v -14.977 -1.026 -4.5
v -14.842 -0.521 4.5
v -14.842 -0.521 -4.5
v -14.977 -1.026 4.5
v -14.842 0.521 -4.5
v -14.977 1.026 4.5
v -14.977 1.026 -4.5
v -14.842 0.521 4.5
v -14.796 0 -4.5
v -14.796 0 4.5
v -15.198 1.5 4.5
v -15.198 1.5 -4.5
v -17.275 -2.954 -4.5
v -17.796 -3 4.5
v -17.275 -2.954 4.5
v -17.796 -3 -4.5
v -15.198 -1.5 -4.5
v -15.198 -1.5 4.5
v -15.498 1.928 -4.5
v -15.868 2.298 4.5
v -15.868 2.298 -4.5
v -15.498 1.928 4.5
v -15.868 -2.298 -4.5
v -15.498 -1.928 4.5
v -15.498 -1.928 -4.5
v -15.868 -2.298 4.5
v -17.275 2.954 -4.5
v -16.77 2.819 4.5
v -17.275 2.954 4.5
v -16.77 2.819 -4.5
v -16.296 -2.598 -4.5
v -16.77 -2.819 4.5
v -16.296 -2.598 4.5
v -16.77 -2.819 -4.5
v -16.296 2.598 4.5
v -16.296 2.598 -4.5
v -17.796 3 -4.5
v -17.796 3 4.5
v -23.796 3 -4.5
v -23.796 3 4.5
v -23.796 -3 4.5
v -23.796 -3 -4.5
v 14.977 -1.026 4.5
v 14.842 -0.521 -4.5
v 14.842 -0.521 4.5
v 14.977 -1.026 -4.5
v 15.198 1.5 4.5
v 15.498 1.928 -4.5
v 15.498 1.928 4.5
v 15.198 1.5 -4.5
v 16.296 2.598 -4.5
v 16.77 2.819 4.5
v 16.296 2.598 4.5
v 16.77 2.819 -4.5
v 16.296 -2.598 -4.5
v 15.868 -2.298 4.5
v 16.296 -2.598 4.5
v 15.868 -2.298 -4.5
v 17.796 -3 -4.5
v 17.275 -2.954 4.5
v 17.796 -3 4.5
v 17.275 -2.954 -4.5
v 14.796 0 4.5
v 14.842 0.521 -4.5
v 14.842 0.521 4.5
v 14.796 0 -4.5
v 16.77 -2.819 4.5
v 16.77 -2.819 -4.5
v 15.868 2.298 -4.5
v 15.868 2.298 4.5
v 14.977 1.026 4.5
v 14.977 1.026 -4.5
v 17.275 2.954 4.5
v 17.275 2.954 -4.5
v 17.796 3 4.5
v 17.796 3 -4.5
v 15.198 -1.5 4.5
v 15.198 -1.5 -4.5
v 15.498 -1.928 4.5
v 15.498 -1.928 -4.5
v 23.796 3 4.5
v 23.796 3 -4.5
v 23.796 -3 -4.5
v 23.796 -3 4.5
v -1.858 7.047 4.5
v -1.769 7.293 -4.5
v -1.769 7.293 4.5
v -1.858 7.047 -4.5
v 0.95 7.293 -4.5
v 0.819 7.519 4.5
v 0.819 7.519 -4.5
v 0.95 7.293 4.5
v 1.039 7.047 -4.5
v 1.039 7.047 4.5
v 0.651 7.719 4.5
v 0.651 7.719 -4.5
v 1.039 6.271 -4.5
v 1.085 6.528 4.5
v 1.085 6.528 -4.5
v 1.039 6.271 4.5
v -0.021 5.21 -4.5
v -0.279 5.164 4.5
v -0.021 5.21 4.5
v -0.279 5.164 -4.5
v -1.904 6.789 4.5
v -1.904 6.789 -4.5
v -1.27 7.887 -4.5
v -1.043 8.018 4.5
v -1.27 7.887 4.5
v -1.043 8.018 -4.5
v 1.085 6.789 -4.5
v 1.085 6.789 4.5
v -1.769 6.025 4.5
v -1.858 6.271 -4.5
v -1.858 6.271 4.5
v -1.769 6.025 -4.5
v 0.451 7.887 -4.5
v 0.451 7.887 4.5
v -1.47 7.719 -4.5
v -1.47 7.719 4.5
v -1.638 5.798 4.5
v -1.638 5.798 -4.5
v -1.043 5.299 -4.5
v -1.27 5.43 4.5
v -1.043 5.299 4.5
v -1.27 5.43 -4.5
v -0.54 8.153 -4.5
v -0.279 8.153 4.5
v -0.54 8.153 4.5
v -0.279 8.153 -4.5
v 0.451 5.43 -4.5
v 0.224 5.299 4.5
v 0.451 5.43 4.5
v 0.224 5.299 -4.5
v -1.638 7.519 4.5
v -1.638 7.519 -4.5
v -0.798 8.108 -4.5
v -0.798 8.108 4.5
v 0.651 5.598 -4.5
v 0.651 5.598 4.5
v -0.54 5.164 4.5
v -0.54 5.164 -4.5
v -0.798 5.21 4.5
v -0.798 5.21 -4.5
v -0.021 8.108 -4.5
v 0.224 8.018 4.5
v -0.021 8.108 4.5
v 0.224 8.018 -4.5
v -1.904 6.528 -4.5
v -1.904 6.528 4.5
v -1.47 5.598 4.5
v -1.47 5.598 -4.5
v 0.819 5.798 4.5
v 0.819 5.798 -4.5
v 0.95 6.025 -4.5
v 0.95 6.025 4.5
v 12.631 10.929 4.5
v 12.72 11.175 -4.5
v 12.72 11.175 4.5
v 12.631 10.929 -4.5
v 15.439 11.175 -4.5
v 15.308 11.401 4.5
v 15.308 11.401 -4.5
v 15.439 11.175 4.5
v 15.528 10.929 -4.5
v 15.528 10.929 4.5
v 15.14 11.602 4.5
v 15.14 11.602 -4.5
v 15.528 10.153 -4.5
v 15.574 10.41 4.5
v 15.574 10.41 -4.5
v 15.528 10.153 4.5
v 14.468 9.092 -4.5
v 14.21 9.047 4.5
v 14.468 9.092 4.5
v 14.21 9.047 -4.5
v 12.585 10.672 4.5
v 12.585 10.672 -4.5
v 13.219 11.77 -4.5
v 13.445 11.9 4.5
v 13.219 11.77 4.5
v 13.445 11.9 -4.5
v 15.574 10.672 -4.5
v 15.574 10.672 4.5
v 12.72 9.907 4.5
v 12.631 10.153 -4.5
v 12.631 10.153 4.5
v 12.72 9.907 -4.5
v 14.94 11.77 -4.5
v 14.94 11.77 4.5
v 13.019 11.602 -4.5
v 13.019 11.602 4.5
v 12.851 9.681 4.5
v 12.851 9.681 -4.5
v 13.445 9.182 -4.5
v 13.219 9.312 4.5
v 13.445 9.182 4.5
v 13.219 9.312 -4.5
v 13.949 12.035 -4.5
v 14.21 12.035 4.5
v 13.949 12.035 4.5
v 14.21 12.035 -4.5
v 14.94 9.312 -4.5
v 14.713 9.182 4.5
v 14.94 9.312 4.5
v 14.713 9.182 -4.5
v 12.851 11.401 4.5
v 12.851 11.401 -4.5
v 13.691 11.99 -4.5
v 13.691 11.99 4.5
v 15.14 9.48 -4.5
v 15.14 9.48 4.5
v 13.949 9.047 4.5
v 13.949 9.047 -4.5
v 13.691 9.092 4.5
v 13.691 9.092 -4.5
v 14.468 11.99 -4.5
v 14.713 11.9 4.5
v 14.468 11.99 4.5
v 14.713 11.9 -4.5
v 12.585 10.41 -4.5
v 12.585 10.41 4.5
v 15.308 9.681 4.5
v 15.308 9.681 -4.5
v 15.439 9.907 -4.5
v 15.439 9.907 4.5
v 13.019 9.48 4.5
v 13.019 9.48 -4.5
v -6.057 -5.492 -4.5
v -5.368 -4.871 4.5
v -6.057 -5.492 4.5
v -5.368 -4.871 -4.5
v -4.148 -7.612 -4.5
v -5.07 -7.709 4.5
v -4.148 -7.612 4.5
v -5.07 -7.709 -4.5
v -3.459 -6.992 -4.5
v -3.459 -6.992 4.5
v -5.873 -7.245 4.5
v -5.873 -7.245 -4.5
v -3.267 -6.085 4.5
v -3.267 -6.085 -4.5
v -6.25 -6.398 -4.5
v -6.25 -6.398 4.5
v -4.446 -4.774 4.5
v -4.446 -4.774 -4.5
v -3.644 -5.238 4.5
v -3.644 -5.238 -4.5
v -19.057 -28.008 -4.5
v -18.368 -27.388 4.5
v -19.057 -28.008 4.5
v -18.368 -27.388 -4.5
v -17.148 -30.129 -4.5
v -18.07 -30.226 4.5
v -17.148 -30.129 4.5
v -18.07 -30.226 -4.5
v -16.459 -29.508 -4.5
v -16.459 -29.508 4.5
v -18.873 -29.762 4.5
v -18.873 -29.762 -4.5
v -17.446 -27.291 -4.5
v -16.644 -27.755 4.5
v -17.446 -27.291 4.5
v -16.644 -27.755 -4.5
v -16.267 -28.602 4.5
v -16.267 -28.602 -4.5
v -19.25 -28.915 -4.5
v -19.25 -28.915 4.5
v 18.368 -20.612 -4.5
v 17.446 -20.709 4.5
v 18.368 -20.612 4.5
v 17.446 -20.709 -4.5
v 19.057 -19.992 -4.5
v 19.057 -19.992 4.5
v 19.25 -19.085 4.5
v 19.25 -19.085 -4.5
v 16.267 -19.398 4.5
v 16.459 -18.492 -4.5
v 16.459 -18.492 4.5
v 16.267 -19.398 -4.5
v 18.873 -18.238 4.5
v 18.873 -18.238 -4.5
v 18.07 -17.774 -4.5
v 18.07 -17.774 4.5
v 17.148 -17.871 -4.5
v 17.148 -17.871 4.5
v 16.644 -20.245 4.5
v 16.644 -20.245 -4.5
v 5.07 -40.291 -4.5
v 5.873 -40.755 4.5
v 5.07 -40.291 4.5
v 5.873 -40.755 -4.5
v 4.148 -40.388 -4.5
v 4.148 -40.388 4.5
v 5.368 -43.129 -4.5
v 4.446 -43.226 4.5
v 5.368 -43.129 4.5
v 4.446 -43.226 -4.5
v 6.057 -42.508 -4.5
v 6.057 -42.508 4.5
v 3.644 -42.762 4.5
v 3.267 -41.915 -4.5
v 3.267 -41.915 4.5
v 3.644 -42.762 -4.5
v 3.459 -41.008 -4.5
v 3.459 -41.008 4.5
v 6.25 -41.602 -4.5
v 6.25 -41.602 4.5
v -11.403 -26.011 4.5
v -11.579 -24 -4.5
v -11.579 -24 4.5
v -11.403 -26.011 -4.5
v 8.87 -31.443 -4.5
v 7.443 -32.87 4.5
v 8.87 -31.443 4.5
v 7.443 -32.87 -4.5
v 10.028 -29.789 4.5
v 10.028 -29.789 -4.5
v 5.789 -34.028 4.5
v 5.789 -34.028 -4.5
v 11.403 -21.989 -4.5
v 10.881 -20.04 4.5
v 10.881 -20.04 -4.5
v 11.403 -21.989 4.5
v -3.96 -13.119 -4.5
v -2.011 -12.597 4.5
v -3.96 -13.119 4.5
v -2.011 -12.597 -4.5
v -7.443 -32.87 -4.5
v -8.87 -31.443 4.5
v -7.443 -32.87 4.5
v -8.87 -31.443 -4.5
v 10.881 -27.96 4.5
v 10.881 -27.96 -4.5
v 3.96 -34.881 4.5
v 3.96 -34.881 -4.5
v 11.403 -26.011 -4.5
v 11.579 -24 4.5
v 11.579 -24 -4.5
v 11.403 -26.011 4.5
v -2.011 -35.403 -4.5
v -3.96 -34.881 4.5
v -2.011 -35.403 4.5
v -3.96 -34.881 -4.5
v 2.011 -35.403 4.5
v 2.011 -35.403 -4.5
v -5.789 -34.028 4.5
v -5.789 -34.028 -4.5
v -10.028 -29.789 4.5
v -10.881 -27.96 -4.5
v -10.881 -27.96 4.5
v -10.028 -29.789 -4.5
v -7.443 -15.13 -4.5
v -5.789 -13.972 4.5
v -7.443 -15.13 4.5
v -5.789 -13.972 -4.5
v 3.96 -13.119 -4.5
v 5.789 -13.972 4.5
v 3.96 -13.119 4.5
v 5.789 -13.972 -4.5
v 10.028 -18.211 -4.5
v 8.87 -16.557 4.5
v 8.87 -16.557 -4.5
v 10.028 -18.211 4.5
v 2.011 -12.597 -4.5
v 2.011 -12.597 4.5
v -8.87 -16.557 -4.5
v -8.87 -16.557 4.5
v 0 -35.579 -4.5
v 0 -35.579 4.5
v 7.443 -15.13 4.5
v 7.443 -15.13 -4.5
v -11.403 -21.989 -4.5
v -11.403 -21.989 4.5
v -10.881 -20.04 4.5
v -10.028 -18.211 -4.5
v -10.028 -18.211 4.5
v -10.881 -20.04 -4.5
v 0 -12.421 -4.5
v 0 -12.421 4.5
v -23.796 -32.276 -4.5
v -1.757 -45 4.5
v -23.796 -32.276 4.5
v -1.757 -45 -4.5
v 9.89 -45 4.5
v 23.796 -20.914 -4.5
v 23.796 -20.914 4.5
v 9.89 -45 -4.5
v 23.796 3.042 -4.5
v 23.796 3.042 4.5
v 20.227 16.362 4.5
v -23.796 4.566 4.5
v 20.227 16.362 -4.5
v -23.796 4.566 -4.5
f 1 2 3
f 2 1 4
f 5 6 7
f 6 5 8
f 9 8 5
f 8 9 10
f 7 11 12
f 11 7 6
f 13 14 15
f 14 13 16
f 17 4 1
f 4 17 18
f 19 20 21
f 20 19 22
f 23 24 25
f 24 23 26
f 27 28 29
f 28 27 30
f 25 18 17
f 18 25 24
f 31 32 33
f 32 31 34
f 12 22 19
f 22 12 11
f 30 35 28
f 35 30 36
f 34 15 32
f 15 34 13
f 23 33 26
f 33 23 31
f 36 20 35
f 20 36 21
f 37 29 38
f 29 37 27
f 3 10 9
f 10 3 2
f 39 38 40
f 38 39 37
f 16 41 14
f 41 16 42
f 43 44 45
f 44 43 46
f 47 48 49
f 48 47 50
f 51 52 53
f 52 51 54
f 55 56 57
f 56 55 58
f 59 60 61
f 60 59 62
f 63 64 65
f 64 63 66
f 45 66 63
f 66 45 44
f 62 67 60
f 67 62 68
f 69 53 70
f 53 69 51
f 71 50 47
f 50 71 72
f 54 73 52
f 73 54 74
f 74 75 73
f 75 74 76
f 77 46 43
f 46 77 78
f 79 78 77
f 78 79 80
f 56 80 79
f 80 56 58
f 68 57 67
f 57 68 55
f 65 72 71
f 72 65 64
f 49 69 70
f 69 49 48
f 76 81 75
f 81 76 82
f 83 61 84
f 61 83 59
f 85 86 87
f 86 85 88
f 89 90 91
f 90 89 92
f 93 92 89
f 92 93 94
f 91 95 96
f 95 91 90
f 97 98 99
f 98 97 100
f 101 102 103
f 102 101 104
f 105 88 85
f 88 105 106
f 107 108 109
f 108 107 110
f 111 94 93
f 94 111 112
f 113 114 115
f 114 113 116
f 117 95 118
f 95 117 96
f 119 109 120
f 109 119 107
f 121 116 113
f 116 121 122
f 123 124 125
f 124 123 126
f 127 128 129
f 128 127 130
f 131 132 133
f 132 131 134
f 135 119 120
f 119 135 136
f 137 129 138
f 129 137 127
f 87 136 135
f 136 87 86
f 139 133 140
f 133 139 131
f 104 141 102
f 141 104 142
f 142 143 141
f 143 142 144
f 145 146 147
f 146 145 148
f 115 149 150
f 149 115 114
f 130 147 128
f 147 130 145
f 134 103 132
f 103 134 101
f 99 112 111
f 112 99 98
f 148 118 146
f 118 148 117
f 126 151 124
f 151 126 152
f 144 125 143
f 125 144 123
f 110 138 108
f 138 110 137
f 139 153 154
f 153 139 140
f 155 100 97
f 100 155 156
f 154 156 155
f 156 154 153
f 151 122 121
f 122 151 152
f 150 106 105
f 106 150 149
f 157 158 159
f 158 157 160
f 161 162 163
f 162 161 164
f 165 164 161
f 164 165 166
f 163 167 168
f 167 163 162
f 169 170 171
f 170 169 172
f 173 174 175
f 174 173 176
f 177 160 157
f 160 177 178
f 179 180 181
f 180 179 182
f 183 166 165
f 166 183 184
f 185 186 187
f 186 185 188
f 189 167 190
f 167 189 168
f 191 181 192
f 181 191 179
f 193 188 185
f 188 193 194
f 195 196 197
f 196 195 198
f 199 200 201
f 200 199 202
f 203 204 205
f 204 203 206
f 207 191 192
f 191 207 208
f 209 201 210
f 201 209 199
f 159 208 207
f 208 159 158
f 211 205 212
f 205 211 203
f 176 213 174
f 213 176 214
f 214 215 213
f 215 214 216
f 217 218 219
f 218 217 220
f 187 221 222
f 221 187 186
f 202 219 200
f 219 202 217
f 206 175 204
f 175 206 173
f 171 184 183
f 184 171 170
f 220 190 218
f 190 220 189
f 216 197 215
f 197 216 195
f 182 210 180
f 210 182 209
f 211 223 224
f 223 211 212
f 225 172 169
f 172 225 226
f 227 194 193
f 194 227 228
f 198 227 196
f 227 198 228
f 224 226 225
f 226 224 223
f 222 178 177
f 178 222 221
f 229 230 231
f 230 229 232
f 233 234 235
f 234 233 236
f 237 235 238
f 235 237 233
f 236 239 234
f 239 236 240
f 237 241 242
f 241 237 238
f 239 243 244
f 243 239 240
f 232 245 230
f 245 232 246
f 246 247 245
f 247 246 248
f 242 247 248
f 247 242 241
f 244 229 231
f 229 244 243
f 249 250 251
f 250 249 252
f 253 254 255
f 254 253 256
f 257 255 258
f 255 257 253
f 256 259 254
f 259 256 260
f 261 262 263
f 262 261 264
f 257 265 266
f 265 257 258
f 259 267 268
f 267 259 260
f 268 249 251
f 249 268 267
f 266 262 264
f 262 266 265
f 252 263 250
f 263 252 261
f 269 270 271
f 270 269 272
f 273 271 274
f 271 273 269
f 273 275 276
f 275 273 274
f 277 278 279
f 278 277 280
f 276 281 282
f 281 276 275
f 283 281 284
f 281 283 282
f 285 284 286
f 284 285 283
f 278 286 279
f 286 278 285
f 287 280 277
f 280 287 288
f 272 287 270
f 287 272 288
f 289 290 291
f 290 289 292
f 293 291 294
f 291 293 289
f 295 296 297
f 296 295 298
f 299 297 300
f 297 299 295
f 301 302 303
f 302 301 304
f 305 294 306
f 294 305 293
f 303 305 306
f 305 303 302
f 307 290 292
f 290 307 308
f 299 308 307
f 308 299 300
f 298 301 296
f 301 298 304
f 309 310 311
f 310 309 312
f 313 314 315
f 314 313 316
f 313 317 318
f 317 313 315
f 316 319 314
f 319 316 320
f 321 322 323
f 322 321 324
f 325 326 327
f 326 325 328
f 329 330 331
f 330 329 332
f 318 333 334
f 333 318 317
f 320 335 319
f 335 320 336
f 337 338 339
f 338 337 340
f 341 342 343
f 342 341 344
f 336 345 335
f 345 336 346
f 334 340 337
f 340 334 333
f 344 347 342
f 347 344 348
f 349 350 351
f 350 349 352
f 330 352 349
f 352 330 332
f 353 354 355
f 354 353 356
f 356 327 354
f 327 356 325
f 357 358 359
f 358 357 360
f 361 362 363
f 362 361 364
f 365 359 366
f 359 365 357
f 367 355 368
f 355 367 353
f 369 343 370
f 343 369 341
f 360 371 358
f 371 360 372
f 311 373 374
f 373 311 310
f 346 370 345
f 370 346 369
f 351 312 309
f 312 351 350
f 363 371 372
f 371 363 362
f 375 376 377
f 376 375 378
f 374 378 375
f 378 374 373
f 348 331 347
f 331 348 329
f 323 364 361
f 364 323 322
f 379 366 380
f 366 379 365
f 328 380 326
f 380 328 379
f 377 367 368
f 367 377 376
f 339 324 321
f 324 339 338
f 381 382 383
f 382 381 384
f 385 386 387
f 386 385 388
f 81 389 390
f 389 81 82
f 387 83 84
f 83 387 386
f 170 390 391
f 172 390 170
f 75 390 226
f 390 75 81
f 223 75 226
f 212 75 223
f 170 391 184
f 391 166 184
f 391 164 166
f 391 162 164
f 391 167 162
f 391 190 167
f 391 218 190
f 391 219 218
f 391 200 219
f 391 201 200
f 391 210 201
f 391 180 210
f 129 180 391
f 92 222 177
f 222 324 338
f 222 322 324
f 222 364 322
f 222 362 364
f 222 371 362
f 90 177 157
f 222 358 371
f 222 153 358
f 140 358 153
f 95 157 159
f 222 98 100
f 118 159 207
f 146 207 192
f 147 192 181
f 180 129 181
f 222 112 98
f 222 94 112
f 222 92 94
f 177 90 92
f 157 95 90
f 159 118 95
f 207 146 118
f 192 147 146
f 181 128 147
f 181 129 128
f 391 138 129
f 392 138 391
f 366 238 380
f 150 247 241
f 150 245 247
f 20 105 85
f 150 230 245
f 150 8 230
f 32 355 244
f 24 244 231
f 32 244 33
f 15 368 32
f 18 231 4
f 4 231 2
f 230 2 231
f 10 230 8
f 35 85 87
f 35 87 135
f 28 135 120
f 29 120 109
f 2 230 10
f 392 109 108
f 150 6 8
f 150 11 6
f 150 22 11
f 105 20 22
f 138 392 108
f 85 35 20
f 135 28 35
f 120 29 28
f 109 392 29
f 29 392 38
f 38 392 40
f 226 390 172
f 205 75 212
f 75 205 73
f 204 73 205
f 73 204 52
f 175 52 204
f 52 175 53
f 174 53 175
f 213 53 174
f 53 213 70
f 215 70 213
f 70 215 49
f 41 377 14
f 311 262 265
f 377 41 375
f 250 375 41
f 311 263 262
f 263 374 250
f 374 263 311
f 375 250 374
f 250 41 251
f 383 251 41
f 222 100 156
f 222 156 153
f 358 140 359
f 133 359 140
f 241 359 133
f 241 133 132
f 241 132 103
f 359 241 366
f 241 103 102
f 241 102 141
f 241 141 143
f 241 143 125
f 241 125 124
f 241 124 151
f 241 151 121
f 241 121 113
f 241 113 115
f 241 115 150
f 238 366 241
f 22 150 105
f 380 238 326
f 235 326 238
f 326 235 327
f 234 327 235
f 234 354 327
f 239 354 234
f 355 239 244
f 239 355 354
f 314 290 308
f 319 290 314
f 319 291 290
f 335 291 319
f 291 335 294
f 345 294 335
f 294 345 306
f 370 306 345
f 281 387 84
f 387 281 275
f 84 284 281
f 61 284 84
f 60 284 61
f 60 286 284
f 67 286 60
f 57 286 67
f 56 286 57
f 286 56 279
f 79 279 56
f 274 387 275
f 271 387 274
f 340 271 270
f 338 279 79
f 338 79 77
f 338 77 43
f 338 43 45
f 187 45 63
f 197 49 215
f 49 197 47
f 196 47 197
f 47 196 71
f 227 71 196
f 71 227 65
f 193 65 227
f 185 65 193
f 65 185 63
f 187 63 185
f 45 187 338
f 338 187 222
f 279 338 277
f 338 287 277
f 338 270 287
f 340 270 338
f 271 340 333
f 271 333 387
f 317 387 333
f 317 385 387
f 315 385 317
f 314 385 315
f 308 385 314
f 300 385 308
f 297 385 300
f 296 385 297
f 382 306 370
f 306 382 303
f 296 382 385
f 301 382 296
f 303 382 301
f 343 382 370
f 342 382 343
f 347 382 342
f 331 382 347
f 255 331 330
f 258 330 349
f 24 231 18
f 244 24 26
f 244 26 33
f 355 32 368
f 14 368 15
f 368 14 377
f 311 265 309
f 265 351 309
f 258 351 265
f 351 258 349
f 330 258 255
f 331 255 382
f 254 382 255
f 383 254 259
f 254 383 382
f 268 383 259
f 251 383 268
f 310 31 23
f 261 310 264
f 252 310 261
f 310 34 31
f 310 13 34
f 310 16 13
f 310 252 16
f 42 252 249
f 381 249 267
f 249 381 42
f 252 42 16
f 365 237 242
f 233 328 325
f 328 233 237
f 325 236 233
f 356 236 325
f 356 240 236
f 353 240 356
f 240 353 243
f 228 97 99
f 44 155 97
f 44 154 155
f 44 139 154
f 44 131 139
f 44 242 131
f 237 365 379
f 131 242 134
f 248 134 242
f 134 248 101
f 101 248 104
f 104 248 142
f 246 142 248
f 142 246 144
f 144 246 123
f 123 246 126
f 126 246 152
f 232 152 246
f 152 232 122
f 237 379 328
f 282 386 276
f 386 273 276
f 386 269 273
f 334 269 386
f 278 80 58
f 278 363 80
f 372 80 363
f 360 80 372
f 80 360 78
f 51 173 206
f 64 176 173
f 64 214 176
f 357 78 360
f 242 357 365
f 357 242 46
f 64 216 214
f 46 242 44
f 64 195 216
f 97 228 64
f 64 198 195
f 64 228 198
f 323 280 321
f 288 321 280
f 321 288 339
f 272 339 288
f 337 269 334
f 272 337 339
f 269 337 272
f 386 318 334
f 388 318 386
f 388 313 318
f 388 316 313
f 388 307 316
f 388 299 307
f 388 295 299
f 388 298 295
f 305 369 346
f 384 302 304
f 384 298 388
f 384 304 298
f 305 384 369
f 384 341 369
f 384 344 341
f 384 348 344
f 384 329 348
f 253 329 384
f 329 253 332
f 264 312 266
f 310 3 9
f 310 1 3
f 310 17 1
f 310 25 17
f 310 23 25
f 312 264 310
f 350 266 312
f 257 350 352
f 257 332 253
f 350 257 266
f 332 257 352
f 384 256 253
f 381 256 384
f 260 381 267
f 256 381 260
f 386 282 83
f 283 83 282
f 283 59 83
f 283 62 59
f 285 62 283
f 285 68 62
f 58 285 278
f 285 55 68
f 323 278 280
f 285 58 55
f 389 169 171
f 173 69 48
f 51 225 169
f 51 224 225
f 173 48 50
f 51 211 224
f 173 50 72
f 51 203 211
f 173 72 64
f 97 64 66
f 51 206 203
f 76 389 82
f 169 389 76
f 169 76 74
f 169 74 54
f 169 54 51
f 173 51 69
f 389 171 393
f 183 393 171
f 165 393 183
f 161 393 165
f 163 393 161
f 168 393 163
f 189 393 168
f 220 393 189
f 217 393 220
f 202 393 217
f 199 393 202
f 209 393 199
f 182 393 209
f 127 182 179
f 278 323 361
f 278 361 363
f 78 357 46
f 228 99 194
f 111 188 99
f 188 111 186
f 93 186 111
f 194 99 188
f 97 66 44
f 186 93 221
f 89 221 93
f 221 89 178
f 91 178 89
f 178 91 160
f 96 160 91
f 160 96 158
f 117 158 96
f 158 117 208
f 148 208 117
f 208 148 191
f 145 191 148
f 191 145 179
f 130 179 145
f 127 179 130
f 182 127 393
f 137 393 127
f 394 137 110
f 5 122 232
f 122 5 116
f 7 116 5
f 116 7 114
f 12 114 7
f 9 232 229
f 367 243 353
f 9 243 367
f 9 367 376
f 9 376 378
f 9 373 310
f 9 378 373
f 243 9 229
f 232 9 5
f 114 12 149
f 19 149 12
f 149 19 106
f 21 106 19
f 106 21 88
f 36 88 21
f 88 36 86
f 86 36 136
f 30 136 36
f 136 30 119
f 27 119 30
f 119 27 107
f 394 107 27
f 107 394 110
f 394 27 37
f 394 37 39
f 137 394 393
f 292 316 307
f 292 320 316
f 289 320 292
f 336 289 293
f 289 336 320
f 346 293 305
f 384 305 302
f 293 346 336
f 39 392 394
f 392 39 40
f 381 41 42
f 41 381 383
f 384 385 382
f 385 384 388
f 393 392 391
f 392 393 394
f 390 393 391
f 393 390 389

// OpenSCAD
// file: nema14_motor.scad
include <parameters.scad>;
use <library.scad>

module nema14()
{
	color([1,0.4,0.4,1])
	union()
	{
		translate([0, 0, nema14_shaft_length/2 - nema14_shaft_projection - nema14_hub_depth])
			cylinder(r = nema14_shaft/2, h = nema14_shaft_length, center = true, $fn=20);
		translate([0, 0, -nema14_hub_depth])
			cylinder(r = nema14_hub/2, h = nema14_hub_depth*2, center = true, $fn=20);
		translate([0, 0, nema14_length/2])
			cube([nema14_square,nema14_square,nema14_length], center = true);
		union()
		{
			for ( x = [0:1] ) 
			for ( y = [0:1] )
			{
				translate([(x-0.5)*nema14_screws, (y-0.5)*nema14_screws, 0])
					cylinder(r = screwsize/2, h = 30, center = true, $fn=10);
			}
		}
	}


}

//nema14();
// file: library.scad
include <parameters.scad>;


// inner and outer product.  Why aren't these standard?!!!?

function ip(v1 = [0,0,0], v2 = [0,0,0]) = v1.x*v2.x + v1.y*v2.y + v1.z*v2.z;

function op(v1 = [0,0,0], v2 = [0,0,0]) = [v1.y*v2.z - v1.z*v2.y, v1.z*v2.x - v1.x*v2.z, v1.x*v2.y - v1.y*v2.x];

module nema14()
{
	color([1,0.4,0.4,1])
	union()
	{
		translate([0, 0, nema14_shaft_length/2 - nema14_shaft_projection - nema14_hub_depth])
			cylinder(r = nema14_shaft/2, h = nema14_shaft_length, center = true, $fn=20);
		translate([0, 0, -nema14_hub_depth])
			cylinder(r = nema14_hub/2, h = nema14_hub_depth*2, center = true, $fn=20);
		translate([0, 0, nema14_length/2])
			cube([nema14_square,nema14_square,nema14_length], center = true);
		union()
		{
			for ( x = [0:1] ) 
			for ( y = [0:1] )
			{
				translate([(x-0.5)*nema14_screws, (y-0.5)*nema14_screws, 0])
					cylinder(r = screwsize/2, h = 30, center = true, $fn=10);
			}
		}
	}


}

// Pentagon nut that matches a hexagon...

module pentanut(height=40)
{
	rotate([0,0,60])
	intersection()
	{
		translate([-nutsize,-nutsize*5,-20])
			cube([nutsize*10, nutsize*10,height]);
		rotate([0,0,60])
			translate([-nutsize,-nutsize*5,-20])
				cube([nutsize*10, nutsize*10,height]);
		rotate([0,0,120])
			translate([-nutsize,-nutsize*5,-20])
				cube([nutsize*10, nutsize*10,height]);
		rotate([0,0,180])
			translate([-nutsize,-nutsize*5,-20])
				cube([nutsize*10, nutsize*10,height]);
		rotate([0,0,240])
			translate([-nutsize,-nutsize*5,-20])
				cube([nutsize*10, nutsize*10,height]);
	}
}


// Make a RepRap teardrop with its axis along Z
// If truncated is true, chop the apex; if not, come to a point

// I stole this function from Erik...


module teardrop(radius, height, truncateMM)
{
	union()
	{
		if(truncateMM > 0)
		{
			intersection()
			{
				translate([truncateMM,0,height/2]) 
					scale([1,1,height])
						cube([radius*2.8275,radius*2,1],center=true);
				scale([1,1,height]) 
						rotate([0,0,3*45])
							cube([radius,radius,1]);
			}
		} else
		{
			scale([1,1,height])
				rotate([0,0,3*45])
					cube([radius,radius,1]);
		}
		cylinder(r=radius, h = height, $fn=20);
	}
}


// Make a ball-bearing holder cutout

module bearing_holder(radius = 6.5)
{
	union()
	{
		cylinder (h = radius*5, r = radius, center = true, $fn = 20);
		for(i=[0:2])
		{
			rotate([0,0,120*i])
				translate([radius+screwsize/2, 0, 0])
					union()
					{
						cylinder (h = radius*5, r = screwsize/2, center = true, $fn = 20);
						translate([-screwsize, 0, 0])
							cube([2*screwsize, screwsize, radius*5], center = true);
					}
		}
	}
}

// Make a cuboid with a 45 degree top for vertical slots etc

module cen_hat(size)
{
	translate([0, 0, size.x/sqrt(2)])
		union()
		{
			rotate([0, 45, 0])
				cube([size.x, size.y, 5*max(size.x, max(size.y, size.z))], center=true);
			rotate([0, -45, 0])
				cube([size.x, size.y, 5*max(size.x, max(size.y, size.z))], center=true);
		}
}

module hat_cube(size = [1,1,1], center = false)
{
	difference()
	{
		cube(size, center);
		if(center)
			translate([0, 0, size.z/2])
				cen_hat(size);
		else
			translate([size.x/2, size.y/2, size.z])
				cen_hat(size);
	}
}



module rod(length, threaded) if (threaded && renderrodthreads) {
	linear_extrude(height = length, center = true, convexity = 10, twist = -360 * length / rodpitch, $fn = fn)
		translate([rodsize * 0.1 / 2, 0, 0])
			circle(r = rodsize * 0.9 / 2, $fn = fn);
} else cylinder(h = length, r = rodsize / 2, center = true, $fn = fn);


module rodnut(position, washer) render() translate([0, 0, position]) {
	intersection() {
		scale([1, 1, 0.5]) sphere(r = 1.05 * rodsize, center = true);
		difference() {
			cylinder (h = rodnutsize, r = rodnutdiameter / 2, center = true, $fn = 6);
			rod(rodnutsize + 0.1);
		}
	}
	if (washer == 1 || washer == 4) rodwasher(((position > 0) ? -1 : 1) * (rodnutsize + rodwashersize) / 2);
	if (washer == 2 || washer == 4) rodwasher(((position > 0) ? 1 : -1) * (rodnutsize + rodwashersize) / 2);
}


module rodwasher(position) render() translate ([0, 0, position]) difference() {
	cylinder(r = rodwasherdiameter / 2, h = rodwashersize, center = true, $fn = fn);
	rod(rodwashersize + 0.1);
}


module screw(length, nutpos, washer, bearingpos = -1) union(){
	translate([0, 0, -length / 2]) if (renderscrewthreads) {
		linear_extrude(height = length, center = true, convexity = 10, twist = -360 * length / screwpitch, $fn = fn)
			translate([screwsize * 0.1 / 2, 0, 0])
				circle(r = screwsize * 0.9 / 2, $fn = fn);
	} else cylinder(h = length, r = screwsize / 2, center = true, $fn = fn);
	render() difference() {
		translate([0, 0, screwsize / 2]) cylinder(h = screwsize, r = screwsize, center = true, $fn = fn);
		translate([0, 0, screwsize]) cylinder(h = screwsize, r = screwsize / 2, center = true, $fn = 6);
	}
	if (washer > 0 && nutpos > 0) {
		washer(nutpos);
		nut(nutpos + washersize);
	} else if (nutpos > 0) nut(nutpos);
	if (bearingpos >= 0) bearing(bearingpos);
}


module bearing(position) render() translate([0, 0, -position - bearingwidth / 2]) union() {
	difference() {
		cylinder(h = bearingwidth, r = bearingsize / 2, center = true, $fn = fn);
		cylinder(h = bearingwidth * 2, r = bearingsize / 2 - 1, center = true, $fn = fn);
	}
	difference() {
		cylinder(h = bearingwidth - 0.5, r = bearingsize / 2 - 0.5, center = true, $fn = fn);
		cylinder(h = bearingwidth * 2, r = screwsize / 2 + 0.5, center = true, $fn = fn);
	}
	difference() {
		cylinder(h = bearingwidth, r = screwsize / 2 + 1, center = true, $fn = fn);
		cylinder(h = bearingwidth + 0.1, r = screwsize / 2, center = true, $fn = fn);
	}
}


module nut(position, washer) render() translate([0, 0, -position - nutsize / 2]) {
	intersection() {
		scale([1, 1, 0.5]) sphere(r = 1.05 * screwsize, center = true);
		difference() {
			cylinder (h = nutsize, r = nutdiameter / 2, center = true, $fn = 6);
			cylinder(r = screwsize / 2, h = nutsize + 0.1, center = true, $fn = fn);
		}
	}
	if (washer > 0) washer(0);
}


module washer(position) render() translate ([0, 0, -position - washersize / 2]) difference() {
	cylinder(r = washerdiameter / 2, h = washersize, center = true, $fn = fn);
	cylinder(r = screwsize / 2, h = washersize + 0.1, center = true, $fn = fn);
}


//rod(20);
//translate([rodsize * 2.5, 0, 0]) rod(20, true);
//translate([rodsize * 5, 0, 0]) screw(10, true);
//translate([rodsize * 7.5, 0, 0]) bearing();
//translate([rodsize * 10, 0, 0]) rodnut();
//translate([rodsize * 12.5, 0, 0]) rodwasher();
//translate([rodsize * 15, 0, 0]) nut();
//translate([rodsize * 17.5, 0, 0]) washer();

//hat_cube(size=[2,40,2], center=false);

//bearing_holder();

pentanut();
// file: parameters.scad
// Parameters file for RepRap Huxley

pi=3.14159265;

// The relative location in your file system where the .dxf files are
// DXFs are for quick development.  They should be replaced by parameterised CSG in dure course.

fileroot="DXF-files/";

rodsize = 6;	//threaded/smooth rod diameter in mm
xaxis = 182.5;	//width of base in mm
yaxis = 266.5;	//length of base in mm


screwsize = 3;	//bearing bore/screw diameter in mm
bearingsize = 10;	//outer diameter of bearings in mm
bearingwidth = 4;	//width of bearings in mm


rodpitch = rodsize / 6;
rodnutsize = 0.8 * rodsize;
rodnutdiameter = 1.9 * rodsize;
rodwashersize = 0.2 * rodsize;
rodwasherdiameter = 2 * rodsize;
screwpitch = screwsize / 6;
nutsize = 0.8 * screwsize;
nutdiameter = 1.9 * screwsize;
washersize = 0.2 * screwsize;
washerdiameter = 2 * screwsize;
partthick = 2 * rodsize;
vertexrodspace = 2 * rodsize;


c = [0.3, 0.3, 0.3];
rodendoffset = rodnutsize + rodwashersize * 2 + partthick / 2;
vertexoffset = vertexrodspace + rodendoffset;


renderrodthreads = false;
renderscrewthreads = false;
fn = 36;

// The gap between the joining rods at a vertex

vertex_radius=sqrt(rodsize*rodsize + vertexoffset*vertexoffset);
vertex_ang = atan(vertexoffset/rodsize)-30;
vertex_gap = 2*vertex_radius*cos(vertex_ang);

// Nema 14 dimensions - these are absolute

nema14_square=35.3;
nema14_screws=26;
nema14_hub=22;
nema14_hub_depth=2;
nema14_length=36;
nema14_shaft=5;
nema14_shaft_length=66;
nema14_shaft_projection=19;

// The RepRap slide bearings

bearing_mount_centres=18;
bearing_width=7;

// X axis parameters - many should be relative

motor_center_y = 26;
bar_clamp_x=5;
bar_clamp_y=8;
bar_clamp_x_gap=23;
bearing_y=50;
bearing_x=bar_clamp_x_gap + 10;
hole_land=4;
thickness=5;
bearing_low_z = 8;
bearing_z_gap = 25;
bearing_plate_width = bearing_mount_centres+2*hole_land + 10;
bearing_plate_overlap=0.5;
bearing_plate_support=10;
// main file
include <parameters.scad>;
use <library.scad>;
include<nema14_motor.scad>

module y_axis_motor_mount()
{


	difference()
	{
		translate([0, rodsize, 0])
			cube([vertex_gap+2*rodsize, 17*rodsize, 1.5*rodsize], center = true);
		translate([-vertex_gap/2, 0, 0]) 
			union()
			{
				cylinder(h = 3*rodsize, r = rodsize / 2, center = true, $fn = fn);
				translate([-rodsize, 0, 0]) 
					cube([2*rodsize, rodsize, 3*rodsize], center=true);
			}
		translate([vertex_gap/2, 0, 0]) 
			union()
			{
				cylinder(h = 3*rodsize, r = rodsize / 2, center = true, $fn = fn);
				translate([rodsize, 0, 0]) 
					cube([2*rodsize, rodsize, 3*rodsize], center=true);
			}
			

		translate([0, 7*rodsize, 0])
			rotate([0,0,15])
				cube([2*(vertex_gap+rodsize), 10*rodsize, 3*rodsize], center = true);	
		translate([5.6*rodsize, 6*rodsize, 0])
			rotate([0,0,105])
				cube([2*(vertex_gap+rodsize), 6*rodsize, 3*rodsize], center = true);

		translate([-vertex_gap/2, rodsize/3, 0])
			rotate([0,0,15])
			{
				translate([3*rodsize, 0, 0])
					cylinder(h = 3*rodsize, r = screwsize / 2, center = true, $fn = fn);
				translate([5.5*rodsize, 0, 0])
					cylinder(h = 3*rodsize, r = screwsize / 2, center = true, $fn = fn);
			}
		translate([0,-4*rodsize,-rodsize])
		rotate([180,0,-30])
		{
			nema14();
			cylinder(h = 5*rodsize, r = nema14_hub/1.9, center = true, $fn = fn);
			translate([0,nema14_square*1.05 ,-rodsize])
				cube([2*(vertex_gap+rodsize), 6*rodsize, 3*rodsize], center = true);
			translate([nema14_square*1.05 , 0, -rodsize])
				rotate([0,0,90])
				cube([2*(vertex_gap+rodsize), 6*rodsize, 3*rodsize], center = true);
		
		}
	}
}



y_axis_motor_mount();
